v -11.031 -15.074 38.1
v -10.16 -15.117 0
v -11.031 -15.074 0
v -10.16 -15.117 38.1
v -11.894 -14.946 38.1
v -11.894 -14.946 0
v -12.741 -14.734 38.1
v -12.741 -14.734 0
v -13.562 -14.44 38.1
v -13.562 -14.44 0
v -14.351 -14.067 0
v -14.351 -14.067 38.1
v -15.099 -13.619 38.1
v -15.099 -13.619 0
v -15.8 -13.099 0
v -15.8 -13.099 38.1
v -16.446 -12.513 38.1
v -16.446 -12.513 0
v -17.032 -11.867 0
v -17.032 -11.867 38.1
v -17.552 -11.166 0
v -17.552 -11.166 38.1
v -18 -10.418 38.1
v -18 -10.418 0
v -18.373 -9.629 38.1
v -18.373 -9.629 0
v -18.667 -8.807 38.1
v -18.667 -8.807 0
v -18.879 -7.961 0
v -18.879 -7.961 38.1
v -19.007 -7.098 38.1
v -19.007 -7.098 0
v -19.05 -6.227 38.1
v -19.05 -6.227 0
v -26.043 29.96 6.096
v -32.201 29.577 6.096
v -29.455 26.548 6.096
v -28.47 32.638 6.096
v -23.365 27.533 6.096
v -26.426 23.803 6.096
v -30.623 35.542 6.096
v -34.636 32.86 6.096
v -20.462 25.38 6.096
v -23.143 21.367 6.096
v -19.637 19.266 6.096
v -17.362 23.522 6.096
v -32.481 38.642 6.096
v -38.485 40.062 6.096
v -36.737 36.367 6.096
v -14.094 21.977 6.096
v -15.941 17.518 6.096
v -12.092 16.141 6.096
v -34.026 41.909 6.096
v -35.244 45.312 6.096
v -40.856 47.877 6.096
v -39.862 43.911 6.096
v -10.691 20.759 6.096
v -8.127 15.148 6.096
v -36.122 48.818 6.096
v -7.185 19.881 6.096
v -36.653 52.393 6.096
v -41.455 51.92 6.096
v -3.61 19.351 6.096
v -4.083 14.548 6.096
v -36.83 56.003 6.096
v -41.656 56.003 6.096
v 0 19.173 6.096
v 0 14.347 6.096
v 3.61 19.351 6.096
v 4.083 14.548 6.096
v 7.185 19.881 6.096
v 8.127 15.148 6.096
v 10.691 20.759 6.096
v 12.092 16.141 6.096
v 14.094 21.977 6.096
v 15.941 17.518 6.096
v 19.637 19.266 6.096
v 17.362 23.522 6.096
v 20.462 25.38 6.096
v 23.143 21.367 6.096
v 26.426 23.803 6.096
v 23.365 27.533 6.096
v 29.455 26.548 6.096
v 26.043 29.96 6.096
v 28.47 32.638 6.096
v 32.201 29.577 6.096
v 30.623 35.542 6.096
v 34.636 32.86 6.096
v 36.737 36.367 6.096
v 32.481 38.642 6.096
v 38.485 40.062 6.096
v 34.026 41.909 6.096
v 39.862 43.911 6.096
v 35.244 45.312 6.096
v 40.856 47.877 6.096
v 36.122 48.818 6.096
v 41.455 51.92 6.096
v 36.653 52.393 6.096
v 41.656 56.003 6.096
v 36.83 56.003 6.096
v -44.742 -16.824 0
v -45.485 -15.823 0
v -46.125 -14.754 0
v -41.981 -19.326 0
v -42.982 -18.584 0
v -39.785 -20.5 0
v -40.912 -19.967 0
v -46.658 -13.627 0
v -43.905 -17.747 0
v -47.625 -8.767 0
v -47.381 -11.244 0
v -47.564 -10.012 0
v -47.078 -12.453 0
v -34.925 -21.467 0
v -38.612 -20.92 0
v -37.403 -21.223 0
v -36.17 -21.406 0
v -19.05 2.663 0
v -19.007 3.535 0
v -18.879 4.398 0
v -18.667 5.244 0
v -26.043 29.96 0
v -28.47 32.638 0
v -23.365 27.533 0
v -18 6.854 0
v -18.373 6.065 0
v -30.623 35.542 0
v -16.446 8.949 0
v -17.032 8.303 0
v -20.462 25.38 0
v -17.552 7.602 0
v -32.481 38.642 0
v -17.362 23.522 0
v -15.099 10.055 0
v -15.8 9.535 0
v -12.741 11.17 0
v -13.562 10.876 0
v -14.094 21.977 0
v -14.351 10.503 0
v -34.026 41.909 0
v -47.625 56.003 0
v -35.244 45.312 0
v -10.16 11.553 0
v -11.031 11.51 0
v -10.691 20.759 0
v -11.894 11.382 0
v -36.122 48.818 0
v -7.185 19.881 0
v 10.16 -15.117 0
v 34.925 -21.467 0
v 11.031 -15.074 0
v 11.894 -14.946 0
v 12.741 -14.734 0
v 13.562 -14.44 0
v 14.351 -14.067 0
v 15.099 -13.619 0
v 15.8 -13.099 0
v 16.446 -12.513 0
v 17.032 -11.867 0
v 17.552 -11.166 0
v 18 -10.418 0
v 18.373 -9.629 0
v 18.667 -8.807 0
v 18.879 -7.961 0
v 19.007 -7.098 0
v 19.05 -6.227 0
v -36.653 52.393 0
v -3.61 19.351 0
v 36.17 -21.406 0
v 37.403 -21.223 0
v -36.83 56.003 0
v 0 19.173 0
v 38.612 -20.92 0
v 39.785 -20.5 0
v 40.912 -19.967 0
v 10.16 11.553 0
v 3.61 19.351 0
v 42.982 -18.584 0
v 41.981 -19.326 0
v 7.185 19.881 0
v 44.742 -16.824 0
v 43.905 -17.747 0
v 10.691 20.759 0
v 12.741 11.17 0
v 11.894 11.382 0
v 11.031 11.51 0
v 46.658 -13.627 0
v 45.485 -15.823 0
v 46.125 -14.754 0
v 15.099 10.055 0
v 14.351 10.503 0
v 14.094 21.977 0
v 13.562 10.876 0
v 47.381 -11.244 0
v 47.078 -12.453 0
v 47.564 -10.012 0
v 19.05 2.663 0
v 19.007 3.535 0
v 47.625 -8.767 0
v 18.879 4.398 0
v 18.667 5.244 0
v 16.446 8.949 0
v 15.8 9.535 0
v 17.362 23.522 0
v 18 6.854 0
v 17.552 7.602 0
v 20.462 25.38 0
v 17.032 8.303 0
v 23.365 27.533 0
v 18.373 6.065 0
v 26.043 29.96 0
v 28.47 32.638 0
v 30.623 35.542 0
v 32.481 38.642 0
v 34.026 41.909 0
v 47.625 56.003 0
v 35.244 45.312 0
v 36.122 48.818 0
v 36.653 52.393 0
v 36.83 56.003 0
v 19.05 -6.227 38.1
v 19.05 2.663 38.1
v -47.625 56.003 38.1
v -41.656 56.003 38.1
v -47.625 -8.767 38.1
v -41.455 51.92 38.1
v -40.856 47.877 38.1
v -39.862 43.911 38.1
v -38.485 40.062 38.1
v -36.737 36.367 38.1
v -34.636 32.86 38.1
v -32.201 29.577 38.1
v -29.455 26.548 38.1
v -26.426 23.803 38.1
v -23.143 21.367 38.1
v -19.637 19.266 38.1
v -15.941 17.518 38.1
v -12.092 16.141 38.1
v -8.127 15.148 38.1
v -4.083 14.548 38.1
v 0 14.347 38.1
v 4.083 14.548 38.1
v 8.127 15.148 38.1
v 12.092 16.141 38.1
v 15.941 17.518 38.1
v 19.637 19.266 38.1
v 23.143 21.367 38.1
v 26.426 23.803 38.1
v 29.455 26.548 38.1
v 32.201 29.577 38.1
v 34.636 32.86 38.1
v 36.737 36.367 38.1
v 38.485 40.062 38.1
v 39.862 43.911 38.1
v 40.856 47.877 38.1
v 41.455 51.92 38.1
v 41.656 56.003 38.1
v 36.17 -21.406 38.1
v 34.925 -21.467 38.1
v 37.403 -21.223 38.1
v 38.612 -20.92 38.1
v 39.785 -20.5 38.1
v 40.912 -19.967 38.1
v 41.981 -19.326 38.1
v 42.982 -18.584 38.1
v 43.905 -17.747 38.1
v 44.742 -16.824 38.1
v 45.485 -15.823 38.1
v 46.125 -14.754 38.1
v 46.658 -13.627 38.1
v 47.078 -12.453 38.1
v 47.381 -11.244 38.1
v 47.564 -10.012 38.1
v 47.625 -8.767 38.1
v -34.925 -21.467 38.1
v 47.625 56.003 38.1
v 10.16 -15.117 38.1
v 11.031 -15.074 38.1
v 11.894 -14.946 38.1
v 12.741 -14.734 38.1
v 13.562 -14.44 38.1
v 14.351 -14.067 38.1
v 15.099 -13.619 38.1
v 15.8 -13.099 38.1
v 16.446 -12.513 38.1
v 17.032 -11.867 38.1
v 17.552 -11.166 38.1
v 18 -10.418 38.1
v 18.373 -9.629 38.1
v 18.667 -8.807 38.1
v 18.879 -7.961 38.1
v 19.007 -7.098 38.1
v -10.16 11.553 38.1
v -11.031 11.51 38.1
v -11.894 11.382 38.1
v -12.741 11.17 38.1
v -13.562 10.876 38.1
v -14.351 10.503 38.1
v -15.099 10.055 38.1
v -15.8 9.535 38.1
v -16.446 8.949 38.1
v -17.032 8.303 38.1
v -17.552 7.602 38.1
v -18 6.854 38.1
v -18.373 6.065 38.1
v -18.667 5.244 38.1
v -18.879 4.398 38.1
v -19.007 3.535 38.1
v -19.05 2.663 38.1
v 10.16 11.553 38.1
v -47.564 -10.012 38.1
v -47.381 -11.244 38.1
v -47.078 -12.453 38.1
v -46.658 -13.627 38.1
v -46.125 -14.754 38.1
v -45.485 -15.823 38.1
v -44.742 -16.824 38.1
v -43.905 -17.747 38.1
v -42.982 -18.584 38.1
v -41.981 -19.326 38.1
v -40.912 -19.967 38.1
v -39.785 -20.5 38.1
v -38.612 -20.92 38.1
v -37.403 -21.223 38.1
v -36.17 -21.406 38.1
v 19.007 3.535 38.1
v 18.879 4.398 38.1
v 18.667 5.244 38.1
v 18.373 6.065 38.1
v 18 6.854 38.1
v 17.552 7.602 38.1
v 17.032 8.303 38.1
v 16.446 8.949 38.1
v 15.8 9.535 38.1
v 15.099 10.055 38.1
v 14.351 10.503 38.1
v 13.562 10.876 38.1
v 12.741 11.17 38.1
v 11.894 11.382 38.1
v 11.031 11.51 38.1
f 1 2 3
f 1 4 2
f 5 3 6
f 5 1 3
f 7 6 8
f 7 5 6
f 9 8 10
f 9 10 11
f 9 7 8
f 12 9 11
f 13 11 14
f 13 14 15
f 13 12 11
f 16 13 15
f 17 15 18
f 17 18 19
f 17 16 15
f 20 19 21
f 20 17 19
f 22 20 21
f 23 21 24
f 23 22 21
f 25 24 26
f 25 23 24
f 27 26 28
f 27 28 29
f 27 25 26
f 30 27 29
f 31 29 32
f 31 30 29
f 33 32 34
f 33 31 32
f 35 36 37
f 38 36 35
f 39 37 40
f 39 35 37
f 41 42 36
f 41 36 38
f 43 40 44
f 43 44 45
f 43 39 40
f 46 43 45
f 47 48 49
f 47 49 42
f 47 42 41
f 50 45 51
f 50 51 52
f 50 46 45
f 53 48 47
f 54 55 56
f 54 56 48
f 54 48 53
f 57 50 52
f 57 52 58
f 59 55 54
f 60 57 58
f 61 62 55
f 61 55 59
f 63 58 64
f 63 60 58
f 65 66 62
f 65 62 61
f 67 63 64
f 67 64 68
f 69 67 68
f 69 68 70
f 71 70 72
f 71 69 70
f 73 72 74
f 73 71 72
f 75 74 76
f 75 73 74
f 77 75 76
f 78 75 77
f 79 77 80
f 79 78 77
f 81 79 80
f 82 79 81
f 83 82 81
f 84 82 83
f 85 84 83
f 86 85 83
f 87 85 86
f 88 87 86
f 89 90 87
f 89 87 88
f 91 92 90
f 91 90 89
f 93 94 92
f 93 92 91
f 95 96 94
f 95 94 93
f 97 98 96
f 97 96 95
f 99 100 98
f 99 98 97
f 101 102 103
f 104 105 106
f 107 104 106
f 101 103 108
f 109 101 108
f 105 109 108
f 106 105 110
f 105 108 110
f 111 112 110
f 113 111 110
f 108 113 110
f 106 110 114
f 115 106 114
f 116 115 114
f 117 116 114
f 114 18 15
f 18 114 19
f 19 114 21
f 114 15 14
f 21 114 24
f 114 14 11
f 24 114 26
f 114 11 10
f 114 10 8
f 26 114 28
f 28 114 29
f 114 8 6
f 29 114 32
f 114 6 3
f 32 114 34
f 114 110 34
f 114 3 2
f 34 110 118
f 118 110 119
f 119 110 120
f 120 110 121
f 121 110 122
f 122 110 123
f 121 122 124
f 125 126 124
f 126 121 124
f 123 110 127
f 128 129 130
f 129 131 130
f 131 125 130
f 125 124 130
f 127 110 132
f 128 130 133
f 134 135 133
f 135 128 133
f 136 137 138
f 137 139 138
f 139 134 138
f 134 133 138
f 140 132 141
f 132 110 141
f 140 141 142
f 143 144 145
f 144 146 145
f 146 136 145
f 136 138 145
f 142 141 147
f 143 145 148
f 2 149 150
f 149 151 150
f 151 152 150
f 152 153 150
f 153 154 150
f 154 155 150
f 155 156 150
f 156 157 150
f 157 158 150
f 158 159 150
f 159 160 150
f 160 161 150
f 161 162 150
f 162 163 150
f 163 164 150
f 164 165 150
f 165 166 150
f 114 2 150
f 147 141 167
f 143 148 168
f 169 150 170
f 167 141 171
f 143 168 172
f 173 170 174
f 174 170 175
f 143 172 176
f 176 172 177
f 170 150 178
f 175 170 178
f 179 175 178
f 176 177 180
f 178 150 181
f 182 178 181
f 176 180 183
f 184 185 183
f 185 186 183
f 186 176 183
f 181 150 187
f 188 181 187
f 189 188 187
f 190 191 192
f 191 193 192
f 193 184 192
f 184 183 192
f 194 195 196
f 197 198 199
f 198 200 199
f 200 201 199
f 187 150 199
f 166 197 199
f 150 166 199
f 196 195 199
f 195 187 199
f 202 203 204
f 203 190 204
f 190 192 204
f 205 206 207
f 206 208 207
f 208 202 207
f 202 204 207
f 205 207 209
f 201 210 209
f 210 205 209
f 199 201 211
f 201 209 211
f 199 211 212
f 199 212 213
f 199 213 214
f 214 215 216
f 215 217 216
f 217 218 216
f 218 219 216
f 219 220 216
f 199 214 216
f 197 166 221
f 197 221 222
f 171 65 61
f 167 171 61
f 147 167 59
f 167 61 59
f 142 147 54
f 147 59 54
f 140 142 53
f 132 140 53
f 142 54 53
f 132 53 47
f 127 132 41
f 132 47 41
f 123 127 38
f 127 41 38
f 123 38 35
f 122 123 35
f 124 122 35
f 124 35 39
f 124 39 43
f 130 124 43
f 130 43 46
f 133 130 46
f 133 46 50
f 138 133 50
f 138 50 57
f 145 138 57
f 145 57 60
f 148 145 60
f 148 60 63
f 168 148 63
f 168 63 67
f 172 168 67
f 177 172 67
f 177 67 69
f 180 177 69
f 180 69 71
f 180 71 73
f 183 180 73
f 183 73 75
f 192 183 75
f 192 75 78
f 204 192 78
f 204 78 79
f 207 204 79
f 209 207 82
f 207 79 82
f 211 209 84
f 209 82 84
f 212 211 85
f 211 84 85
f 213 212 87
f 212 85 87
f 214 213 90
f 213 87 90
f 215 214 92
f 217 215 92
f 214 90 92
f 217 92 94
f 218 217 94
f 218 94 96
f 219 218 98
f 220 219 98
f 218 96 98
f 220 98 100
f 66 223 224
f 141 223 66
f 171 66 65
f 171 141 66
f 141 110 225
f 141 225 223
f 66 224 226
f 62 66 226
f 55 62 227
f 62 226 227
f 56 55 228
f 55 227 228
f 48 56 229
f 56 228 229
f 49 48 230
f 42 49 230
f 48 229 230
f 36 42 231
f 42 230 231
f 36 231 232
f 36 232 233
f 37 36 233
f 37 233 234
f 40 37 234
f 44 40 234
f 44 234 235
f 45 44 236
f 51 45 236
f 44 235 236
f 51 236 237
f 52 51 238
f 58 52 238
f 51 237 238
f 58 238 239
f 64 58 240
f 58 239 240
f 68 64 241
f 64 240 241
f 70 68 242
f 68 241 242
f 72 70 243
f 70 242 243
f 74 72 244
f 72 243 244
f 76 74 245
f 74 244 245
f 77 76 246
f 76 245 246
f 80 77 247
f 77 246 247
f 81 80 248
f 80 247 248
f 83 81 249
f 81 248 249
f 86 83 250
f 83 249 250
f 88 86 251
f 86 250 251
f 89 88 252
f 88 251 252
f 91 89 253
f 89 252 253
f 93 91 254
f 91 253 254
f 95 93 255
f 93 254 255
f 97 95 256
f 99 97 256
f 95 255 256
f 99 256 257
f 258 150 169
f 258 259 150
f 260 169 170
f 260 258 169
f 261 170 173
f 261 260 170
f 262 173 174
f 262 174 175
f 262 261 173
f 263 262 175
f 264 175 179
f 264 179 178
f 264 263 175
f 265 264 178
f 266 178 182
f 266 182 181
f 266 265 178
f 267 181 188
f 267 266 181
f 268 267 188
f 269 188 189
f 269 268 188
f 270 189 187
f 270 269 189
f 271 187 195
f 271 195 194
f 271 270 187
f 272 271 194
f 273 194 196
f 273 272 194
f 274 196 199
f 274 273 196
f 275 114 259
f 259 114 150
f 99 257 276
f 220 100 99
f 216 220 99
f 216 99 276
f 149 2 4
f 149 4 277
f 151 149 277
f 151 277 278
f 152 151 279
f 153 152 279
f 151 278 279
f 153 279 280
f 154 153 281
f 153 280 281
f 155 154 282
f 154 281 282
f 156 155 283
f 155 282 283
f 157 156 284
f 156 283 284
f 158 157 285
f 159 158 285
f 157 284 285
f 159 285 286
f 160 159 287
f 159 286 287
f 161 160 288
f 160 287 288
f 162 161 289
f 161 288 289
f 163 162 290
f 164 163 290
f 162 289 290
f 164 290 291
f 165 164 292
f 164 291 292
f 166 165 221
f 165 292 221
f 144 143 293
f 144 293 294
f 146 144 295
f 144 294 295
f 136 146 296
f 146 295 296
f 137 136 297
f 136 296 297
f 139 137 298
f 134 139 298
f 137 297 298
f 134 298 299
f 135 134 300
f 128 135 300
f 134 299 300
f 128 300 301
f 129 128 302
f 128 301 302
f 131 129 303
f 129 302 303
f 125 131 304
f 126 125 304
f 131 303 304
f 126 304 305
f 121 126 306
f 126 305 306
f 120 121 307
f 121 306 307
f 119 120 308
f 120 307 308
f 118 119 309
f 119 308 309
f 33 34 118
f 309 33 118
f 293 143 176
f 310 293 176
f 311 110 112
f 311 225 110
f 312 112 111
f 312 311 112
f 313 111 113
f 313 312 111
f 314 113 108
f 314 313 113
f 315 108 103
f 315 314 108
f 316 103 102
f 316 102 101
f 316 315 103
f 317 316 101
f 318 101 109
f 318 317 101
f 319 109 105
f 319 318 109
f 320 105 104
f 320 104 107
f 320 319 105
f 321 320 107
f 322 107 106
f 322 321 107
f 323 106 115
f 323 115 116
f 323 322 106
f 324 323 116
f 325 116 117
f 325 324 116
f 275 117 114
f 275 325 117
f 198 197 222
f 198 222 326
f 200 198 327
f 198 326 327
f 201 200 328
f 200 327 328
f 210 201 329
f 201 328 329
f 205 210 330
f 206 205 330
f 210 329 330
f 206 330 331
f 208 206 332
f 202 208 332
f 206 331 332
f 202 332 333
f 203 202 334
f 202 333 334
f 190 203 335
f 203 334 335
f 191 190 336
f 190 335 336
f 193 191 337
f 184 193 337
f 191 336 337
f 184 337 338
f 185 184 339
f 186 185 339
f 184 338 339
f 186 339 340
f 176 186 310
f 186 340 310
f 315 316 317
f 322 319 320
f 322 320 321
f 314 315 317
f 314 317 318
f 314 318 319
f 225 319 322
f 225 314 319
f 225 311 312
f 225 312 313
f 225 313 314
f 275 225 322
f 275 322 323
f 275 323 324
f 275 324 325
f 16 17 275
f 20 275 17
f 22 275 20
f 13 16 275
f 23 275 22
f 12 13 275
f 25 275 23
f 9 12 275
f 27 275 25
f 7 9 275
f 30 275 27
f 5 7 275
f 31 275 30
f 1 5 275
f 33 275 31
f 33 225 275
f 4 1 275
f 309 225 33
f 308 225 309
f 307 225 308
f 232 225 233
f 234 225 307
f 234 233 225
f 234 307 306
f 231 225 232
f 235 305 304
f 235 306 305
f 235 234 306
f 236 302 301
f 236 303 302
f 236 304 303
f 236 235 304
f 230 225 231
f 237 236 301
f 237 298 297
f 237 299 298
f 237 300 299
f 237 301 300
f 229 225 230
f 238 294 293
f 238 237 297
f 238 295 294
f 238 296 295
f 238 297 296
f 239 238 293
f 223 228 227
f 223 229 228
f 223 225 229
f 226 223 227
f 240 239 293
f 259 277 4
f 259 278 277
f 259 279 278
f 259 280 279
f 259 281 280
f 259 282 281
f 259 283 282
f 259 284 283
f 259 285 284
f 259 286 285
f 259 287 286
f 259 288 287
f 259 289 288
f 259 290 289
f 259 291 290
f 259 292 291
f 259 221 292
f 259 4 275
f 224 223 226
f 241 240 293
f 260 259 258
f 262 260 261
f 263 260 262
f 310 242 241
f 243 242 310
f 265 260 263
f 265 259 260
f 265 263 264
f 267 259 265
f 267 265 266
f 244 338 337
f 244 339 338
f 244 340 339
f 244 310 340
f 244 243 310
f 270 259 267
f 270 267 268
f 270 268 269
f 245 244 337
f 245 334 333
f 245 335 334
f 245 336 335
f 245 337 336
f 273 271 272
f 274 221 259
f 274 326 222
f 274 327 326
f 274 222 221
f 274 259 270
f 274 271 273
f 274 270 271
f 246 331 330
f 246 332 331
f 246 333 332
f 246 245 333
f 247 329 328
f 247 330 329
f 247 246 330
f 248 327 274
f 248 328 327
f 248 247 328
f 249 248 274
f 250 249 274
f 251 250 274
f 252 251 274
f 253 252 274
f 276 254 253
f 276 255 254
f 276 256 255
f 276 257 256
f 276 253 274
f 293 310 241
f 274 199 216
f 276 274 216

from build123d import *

# Parameters (mm, degrees)
F0_W     = 95.25
F0_H     = 77.47
F0_W_2   = 38.1
F0_H_2   = 26.67
F1_DEPTH = 38.1
F2_R     = 12.7
F3_R     = 8.89
F5_DEPTH = 32.004
F7_DEPTH = 25.4


with BuildPart() as f1:
    # F0 (on Top) → F1 (new body)
    with BuildSketch(Plane.XY):
        with Locations((0, 17.2681905271)):
            Rectangle(F0_W, F0_H)
        with Locations((0, -1.7818094729)):
            Rectangle(F0_W_2, F0_H_2, mode=Mode.SUBTRACT)
    extrude(amount=F1_DEPTH)

    # F2
    f2_edges = [f1.edges().sort_by_distance(p)[0] for p in [
        (47.625, -21.466809, 19.05),
        (-47.625, -21.466809, 19.05),
    ]]
    fillet(f2_edges, radius=F2_R)

    # F3
    f3_edges = [f1.edges().sort_by_distance(p)[0] for p in [
        (19.05, -15.116809, 19.05),
        (19.05, 11.553191, 19.05),
        (-19.05, 11.553191, 19.05),
        (-19.05, -15.116809, 19.05),
    ]]
    fillet(f3_edges, radius=F3_R)

    # F4 (on face) → F5 (cut)
    with BuildSketch(Plane.XY.offset(38.1)):
        with BuildLine():
            ThreePointArc((-41.656, 56.0031905271), (0, 14.3471905271), (41.656, 56.0031905271))
            Line((41.656, 56.0031905271), (-41.656, 56.0031905271))
        make_face()
    extrude(amount=-F5_DEPTH, mode=Mode.SUBTRACT)

    # F6 (on face) → F7 (cut)
    with BuildSketch(Plane.XY.offset(6.096)):
        with BuildLine():
            ThreePointArc((-36.83, 56.0031905271), (0, 19.1731905271), (36.83, 56.0031905271))
            Line((36.83, 56.0031905271), (-36.83, 56.0031905271))
        make_face()
    extrude(amount=-F7_DEPTH, mode=Mode.SUBTRACT)


solid = f1.part
